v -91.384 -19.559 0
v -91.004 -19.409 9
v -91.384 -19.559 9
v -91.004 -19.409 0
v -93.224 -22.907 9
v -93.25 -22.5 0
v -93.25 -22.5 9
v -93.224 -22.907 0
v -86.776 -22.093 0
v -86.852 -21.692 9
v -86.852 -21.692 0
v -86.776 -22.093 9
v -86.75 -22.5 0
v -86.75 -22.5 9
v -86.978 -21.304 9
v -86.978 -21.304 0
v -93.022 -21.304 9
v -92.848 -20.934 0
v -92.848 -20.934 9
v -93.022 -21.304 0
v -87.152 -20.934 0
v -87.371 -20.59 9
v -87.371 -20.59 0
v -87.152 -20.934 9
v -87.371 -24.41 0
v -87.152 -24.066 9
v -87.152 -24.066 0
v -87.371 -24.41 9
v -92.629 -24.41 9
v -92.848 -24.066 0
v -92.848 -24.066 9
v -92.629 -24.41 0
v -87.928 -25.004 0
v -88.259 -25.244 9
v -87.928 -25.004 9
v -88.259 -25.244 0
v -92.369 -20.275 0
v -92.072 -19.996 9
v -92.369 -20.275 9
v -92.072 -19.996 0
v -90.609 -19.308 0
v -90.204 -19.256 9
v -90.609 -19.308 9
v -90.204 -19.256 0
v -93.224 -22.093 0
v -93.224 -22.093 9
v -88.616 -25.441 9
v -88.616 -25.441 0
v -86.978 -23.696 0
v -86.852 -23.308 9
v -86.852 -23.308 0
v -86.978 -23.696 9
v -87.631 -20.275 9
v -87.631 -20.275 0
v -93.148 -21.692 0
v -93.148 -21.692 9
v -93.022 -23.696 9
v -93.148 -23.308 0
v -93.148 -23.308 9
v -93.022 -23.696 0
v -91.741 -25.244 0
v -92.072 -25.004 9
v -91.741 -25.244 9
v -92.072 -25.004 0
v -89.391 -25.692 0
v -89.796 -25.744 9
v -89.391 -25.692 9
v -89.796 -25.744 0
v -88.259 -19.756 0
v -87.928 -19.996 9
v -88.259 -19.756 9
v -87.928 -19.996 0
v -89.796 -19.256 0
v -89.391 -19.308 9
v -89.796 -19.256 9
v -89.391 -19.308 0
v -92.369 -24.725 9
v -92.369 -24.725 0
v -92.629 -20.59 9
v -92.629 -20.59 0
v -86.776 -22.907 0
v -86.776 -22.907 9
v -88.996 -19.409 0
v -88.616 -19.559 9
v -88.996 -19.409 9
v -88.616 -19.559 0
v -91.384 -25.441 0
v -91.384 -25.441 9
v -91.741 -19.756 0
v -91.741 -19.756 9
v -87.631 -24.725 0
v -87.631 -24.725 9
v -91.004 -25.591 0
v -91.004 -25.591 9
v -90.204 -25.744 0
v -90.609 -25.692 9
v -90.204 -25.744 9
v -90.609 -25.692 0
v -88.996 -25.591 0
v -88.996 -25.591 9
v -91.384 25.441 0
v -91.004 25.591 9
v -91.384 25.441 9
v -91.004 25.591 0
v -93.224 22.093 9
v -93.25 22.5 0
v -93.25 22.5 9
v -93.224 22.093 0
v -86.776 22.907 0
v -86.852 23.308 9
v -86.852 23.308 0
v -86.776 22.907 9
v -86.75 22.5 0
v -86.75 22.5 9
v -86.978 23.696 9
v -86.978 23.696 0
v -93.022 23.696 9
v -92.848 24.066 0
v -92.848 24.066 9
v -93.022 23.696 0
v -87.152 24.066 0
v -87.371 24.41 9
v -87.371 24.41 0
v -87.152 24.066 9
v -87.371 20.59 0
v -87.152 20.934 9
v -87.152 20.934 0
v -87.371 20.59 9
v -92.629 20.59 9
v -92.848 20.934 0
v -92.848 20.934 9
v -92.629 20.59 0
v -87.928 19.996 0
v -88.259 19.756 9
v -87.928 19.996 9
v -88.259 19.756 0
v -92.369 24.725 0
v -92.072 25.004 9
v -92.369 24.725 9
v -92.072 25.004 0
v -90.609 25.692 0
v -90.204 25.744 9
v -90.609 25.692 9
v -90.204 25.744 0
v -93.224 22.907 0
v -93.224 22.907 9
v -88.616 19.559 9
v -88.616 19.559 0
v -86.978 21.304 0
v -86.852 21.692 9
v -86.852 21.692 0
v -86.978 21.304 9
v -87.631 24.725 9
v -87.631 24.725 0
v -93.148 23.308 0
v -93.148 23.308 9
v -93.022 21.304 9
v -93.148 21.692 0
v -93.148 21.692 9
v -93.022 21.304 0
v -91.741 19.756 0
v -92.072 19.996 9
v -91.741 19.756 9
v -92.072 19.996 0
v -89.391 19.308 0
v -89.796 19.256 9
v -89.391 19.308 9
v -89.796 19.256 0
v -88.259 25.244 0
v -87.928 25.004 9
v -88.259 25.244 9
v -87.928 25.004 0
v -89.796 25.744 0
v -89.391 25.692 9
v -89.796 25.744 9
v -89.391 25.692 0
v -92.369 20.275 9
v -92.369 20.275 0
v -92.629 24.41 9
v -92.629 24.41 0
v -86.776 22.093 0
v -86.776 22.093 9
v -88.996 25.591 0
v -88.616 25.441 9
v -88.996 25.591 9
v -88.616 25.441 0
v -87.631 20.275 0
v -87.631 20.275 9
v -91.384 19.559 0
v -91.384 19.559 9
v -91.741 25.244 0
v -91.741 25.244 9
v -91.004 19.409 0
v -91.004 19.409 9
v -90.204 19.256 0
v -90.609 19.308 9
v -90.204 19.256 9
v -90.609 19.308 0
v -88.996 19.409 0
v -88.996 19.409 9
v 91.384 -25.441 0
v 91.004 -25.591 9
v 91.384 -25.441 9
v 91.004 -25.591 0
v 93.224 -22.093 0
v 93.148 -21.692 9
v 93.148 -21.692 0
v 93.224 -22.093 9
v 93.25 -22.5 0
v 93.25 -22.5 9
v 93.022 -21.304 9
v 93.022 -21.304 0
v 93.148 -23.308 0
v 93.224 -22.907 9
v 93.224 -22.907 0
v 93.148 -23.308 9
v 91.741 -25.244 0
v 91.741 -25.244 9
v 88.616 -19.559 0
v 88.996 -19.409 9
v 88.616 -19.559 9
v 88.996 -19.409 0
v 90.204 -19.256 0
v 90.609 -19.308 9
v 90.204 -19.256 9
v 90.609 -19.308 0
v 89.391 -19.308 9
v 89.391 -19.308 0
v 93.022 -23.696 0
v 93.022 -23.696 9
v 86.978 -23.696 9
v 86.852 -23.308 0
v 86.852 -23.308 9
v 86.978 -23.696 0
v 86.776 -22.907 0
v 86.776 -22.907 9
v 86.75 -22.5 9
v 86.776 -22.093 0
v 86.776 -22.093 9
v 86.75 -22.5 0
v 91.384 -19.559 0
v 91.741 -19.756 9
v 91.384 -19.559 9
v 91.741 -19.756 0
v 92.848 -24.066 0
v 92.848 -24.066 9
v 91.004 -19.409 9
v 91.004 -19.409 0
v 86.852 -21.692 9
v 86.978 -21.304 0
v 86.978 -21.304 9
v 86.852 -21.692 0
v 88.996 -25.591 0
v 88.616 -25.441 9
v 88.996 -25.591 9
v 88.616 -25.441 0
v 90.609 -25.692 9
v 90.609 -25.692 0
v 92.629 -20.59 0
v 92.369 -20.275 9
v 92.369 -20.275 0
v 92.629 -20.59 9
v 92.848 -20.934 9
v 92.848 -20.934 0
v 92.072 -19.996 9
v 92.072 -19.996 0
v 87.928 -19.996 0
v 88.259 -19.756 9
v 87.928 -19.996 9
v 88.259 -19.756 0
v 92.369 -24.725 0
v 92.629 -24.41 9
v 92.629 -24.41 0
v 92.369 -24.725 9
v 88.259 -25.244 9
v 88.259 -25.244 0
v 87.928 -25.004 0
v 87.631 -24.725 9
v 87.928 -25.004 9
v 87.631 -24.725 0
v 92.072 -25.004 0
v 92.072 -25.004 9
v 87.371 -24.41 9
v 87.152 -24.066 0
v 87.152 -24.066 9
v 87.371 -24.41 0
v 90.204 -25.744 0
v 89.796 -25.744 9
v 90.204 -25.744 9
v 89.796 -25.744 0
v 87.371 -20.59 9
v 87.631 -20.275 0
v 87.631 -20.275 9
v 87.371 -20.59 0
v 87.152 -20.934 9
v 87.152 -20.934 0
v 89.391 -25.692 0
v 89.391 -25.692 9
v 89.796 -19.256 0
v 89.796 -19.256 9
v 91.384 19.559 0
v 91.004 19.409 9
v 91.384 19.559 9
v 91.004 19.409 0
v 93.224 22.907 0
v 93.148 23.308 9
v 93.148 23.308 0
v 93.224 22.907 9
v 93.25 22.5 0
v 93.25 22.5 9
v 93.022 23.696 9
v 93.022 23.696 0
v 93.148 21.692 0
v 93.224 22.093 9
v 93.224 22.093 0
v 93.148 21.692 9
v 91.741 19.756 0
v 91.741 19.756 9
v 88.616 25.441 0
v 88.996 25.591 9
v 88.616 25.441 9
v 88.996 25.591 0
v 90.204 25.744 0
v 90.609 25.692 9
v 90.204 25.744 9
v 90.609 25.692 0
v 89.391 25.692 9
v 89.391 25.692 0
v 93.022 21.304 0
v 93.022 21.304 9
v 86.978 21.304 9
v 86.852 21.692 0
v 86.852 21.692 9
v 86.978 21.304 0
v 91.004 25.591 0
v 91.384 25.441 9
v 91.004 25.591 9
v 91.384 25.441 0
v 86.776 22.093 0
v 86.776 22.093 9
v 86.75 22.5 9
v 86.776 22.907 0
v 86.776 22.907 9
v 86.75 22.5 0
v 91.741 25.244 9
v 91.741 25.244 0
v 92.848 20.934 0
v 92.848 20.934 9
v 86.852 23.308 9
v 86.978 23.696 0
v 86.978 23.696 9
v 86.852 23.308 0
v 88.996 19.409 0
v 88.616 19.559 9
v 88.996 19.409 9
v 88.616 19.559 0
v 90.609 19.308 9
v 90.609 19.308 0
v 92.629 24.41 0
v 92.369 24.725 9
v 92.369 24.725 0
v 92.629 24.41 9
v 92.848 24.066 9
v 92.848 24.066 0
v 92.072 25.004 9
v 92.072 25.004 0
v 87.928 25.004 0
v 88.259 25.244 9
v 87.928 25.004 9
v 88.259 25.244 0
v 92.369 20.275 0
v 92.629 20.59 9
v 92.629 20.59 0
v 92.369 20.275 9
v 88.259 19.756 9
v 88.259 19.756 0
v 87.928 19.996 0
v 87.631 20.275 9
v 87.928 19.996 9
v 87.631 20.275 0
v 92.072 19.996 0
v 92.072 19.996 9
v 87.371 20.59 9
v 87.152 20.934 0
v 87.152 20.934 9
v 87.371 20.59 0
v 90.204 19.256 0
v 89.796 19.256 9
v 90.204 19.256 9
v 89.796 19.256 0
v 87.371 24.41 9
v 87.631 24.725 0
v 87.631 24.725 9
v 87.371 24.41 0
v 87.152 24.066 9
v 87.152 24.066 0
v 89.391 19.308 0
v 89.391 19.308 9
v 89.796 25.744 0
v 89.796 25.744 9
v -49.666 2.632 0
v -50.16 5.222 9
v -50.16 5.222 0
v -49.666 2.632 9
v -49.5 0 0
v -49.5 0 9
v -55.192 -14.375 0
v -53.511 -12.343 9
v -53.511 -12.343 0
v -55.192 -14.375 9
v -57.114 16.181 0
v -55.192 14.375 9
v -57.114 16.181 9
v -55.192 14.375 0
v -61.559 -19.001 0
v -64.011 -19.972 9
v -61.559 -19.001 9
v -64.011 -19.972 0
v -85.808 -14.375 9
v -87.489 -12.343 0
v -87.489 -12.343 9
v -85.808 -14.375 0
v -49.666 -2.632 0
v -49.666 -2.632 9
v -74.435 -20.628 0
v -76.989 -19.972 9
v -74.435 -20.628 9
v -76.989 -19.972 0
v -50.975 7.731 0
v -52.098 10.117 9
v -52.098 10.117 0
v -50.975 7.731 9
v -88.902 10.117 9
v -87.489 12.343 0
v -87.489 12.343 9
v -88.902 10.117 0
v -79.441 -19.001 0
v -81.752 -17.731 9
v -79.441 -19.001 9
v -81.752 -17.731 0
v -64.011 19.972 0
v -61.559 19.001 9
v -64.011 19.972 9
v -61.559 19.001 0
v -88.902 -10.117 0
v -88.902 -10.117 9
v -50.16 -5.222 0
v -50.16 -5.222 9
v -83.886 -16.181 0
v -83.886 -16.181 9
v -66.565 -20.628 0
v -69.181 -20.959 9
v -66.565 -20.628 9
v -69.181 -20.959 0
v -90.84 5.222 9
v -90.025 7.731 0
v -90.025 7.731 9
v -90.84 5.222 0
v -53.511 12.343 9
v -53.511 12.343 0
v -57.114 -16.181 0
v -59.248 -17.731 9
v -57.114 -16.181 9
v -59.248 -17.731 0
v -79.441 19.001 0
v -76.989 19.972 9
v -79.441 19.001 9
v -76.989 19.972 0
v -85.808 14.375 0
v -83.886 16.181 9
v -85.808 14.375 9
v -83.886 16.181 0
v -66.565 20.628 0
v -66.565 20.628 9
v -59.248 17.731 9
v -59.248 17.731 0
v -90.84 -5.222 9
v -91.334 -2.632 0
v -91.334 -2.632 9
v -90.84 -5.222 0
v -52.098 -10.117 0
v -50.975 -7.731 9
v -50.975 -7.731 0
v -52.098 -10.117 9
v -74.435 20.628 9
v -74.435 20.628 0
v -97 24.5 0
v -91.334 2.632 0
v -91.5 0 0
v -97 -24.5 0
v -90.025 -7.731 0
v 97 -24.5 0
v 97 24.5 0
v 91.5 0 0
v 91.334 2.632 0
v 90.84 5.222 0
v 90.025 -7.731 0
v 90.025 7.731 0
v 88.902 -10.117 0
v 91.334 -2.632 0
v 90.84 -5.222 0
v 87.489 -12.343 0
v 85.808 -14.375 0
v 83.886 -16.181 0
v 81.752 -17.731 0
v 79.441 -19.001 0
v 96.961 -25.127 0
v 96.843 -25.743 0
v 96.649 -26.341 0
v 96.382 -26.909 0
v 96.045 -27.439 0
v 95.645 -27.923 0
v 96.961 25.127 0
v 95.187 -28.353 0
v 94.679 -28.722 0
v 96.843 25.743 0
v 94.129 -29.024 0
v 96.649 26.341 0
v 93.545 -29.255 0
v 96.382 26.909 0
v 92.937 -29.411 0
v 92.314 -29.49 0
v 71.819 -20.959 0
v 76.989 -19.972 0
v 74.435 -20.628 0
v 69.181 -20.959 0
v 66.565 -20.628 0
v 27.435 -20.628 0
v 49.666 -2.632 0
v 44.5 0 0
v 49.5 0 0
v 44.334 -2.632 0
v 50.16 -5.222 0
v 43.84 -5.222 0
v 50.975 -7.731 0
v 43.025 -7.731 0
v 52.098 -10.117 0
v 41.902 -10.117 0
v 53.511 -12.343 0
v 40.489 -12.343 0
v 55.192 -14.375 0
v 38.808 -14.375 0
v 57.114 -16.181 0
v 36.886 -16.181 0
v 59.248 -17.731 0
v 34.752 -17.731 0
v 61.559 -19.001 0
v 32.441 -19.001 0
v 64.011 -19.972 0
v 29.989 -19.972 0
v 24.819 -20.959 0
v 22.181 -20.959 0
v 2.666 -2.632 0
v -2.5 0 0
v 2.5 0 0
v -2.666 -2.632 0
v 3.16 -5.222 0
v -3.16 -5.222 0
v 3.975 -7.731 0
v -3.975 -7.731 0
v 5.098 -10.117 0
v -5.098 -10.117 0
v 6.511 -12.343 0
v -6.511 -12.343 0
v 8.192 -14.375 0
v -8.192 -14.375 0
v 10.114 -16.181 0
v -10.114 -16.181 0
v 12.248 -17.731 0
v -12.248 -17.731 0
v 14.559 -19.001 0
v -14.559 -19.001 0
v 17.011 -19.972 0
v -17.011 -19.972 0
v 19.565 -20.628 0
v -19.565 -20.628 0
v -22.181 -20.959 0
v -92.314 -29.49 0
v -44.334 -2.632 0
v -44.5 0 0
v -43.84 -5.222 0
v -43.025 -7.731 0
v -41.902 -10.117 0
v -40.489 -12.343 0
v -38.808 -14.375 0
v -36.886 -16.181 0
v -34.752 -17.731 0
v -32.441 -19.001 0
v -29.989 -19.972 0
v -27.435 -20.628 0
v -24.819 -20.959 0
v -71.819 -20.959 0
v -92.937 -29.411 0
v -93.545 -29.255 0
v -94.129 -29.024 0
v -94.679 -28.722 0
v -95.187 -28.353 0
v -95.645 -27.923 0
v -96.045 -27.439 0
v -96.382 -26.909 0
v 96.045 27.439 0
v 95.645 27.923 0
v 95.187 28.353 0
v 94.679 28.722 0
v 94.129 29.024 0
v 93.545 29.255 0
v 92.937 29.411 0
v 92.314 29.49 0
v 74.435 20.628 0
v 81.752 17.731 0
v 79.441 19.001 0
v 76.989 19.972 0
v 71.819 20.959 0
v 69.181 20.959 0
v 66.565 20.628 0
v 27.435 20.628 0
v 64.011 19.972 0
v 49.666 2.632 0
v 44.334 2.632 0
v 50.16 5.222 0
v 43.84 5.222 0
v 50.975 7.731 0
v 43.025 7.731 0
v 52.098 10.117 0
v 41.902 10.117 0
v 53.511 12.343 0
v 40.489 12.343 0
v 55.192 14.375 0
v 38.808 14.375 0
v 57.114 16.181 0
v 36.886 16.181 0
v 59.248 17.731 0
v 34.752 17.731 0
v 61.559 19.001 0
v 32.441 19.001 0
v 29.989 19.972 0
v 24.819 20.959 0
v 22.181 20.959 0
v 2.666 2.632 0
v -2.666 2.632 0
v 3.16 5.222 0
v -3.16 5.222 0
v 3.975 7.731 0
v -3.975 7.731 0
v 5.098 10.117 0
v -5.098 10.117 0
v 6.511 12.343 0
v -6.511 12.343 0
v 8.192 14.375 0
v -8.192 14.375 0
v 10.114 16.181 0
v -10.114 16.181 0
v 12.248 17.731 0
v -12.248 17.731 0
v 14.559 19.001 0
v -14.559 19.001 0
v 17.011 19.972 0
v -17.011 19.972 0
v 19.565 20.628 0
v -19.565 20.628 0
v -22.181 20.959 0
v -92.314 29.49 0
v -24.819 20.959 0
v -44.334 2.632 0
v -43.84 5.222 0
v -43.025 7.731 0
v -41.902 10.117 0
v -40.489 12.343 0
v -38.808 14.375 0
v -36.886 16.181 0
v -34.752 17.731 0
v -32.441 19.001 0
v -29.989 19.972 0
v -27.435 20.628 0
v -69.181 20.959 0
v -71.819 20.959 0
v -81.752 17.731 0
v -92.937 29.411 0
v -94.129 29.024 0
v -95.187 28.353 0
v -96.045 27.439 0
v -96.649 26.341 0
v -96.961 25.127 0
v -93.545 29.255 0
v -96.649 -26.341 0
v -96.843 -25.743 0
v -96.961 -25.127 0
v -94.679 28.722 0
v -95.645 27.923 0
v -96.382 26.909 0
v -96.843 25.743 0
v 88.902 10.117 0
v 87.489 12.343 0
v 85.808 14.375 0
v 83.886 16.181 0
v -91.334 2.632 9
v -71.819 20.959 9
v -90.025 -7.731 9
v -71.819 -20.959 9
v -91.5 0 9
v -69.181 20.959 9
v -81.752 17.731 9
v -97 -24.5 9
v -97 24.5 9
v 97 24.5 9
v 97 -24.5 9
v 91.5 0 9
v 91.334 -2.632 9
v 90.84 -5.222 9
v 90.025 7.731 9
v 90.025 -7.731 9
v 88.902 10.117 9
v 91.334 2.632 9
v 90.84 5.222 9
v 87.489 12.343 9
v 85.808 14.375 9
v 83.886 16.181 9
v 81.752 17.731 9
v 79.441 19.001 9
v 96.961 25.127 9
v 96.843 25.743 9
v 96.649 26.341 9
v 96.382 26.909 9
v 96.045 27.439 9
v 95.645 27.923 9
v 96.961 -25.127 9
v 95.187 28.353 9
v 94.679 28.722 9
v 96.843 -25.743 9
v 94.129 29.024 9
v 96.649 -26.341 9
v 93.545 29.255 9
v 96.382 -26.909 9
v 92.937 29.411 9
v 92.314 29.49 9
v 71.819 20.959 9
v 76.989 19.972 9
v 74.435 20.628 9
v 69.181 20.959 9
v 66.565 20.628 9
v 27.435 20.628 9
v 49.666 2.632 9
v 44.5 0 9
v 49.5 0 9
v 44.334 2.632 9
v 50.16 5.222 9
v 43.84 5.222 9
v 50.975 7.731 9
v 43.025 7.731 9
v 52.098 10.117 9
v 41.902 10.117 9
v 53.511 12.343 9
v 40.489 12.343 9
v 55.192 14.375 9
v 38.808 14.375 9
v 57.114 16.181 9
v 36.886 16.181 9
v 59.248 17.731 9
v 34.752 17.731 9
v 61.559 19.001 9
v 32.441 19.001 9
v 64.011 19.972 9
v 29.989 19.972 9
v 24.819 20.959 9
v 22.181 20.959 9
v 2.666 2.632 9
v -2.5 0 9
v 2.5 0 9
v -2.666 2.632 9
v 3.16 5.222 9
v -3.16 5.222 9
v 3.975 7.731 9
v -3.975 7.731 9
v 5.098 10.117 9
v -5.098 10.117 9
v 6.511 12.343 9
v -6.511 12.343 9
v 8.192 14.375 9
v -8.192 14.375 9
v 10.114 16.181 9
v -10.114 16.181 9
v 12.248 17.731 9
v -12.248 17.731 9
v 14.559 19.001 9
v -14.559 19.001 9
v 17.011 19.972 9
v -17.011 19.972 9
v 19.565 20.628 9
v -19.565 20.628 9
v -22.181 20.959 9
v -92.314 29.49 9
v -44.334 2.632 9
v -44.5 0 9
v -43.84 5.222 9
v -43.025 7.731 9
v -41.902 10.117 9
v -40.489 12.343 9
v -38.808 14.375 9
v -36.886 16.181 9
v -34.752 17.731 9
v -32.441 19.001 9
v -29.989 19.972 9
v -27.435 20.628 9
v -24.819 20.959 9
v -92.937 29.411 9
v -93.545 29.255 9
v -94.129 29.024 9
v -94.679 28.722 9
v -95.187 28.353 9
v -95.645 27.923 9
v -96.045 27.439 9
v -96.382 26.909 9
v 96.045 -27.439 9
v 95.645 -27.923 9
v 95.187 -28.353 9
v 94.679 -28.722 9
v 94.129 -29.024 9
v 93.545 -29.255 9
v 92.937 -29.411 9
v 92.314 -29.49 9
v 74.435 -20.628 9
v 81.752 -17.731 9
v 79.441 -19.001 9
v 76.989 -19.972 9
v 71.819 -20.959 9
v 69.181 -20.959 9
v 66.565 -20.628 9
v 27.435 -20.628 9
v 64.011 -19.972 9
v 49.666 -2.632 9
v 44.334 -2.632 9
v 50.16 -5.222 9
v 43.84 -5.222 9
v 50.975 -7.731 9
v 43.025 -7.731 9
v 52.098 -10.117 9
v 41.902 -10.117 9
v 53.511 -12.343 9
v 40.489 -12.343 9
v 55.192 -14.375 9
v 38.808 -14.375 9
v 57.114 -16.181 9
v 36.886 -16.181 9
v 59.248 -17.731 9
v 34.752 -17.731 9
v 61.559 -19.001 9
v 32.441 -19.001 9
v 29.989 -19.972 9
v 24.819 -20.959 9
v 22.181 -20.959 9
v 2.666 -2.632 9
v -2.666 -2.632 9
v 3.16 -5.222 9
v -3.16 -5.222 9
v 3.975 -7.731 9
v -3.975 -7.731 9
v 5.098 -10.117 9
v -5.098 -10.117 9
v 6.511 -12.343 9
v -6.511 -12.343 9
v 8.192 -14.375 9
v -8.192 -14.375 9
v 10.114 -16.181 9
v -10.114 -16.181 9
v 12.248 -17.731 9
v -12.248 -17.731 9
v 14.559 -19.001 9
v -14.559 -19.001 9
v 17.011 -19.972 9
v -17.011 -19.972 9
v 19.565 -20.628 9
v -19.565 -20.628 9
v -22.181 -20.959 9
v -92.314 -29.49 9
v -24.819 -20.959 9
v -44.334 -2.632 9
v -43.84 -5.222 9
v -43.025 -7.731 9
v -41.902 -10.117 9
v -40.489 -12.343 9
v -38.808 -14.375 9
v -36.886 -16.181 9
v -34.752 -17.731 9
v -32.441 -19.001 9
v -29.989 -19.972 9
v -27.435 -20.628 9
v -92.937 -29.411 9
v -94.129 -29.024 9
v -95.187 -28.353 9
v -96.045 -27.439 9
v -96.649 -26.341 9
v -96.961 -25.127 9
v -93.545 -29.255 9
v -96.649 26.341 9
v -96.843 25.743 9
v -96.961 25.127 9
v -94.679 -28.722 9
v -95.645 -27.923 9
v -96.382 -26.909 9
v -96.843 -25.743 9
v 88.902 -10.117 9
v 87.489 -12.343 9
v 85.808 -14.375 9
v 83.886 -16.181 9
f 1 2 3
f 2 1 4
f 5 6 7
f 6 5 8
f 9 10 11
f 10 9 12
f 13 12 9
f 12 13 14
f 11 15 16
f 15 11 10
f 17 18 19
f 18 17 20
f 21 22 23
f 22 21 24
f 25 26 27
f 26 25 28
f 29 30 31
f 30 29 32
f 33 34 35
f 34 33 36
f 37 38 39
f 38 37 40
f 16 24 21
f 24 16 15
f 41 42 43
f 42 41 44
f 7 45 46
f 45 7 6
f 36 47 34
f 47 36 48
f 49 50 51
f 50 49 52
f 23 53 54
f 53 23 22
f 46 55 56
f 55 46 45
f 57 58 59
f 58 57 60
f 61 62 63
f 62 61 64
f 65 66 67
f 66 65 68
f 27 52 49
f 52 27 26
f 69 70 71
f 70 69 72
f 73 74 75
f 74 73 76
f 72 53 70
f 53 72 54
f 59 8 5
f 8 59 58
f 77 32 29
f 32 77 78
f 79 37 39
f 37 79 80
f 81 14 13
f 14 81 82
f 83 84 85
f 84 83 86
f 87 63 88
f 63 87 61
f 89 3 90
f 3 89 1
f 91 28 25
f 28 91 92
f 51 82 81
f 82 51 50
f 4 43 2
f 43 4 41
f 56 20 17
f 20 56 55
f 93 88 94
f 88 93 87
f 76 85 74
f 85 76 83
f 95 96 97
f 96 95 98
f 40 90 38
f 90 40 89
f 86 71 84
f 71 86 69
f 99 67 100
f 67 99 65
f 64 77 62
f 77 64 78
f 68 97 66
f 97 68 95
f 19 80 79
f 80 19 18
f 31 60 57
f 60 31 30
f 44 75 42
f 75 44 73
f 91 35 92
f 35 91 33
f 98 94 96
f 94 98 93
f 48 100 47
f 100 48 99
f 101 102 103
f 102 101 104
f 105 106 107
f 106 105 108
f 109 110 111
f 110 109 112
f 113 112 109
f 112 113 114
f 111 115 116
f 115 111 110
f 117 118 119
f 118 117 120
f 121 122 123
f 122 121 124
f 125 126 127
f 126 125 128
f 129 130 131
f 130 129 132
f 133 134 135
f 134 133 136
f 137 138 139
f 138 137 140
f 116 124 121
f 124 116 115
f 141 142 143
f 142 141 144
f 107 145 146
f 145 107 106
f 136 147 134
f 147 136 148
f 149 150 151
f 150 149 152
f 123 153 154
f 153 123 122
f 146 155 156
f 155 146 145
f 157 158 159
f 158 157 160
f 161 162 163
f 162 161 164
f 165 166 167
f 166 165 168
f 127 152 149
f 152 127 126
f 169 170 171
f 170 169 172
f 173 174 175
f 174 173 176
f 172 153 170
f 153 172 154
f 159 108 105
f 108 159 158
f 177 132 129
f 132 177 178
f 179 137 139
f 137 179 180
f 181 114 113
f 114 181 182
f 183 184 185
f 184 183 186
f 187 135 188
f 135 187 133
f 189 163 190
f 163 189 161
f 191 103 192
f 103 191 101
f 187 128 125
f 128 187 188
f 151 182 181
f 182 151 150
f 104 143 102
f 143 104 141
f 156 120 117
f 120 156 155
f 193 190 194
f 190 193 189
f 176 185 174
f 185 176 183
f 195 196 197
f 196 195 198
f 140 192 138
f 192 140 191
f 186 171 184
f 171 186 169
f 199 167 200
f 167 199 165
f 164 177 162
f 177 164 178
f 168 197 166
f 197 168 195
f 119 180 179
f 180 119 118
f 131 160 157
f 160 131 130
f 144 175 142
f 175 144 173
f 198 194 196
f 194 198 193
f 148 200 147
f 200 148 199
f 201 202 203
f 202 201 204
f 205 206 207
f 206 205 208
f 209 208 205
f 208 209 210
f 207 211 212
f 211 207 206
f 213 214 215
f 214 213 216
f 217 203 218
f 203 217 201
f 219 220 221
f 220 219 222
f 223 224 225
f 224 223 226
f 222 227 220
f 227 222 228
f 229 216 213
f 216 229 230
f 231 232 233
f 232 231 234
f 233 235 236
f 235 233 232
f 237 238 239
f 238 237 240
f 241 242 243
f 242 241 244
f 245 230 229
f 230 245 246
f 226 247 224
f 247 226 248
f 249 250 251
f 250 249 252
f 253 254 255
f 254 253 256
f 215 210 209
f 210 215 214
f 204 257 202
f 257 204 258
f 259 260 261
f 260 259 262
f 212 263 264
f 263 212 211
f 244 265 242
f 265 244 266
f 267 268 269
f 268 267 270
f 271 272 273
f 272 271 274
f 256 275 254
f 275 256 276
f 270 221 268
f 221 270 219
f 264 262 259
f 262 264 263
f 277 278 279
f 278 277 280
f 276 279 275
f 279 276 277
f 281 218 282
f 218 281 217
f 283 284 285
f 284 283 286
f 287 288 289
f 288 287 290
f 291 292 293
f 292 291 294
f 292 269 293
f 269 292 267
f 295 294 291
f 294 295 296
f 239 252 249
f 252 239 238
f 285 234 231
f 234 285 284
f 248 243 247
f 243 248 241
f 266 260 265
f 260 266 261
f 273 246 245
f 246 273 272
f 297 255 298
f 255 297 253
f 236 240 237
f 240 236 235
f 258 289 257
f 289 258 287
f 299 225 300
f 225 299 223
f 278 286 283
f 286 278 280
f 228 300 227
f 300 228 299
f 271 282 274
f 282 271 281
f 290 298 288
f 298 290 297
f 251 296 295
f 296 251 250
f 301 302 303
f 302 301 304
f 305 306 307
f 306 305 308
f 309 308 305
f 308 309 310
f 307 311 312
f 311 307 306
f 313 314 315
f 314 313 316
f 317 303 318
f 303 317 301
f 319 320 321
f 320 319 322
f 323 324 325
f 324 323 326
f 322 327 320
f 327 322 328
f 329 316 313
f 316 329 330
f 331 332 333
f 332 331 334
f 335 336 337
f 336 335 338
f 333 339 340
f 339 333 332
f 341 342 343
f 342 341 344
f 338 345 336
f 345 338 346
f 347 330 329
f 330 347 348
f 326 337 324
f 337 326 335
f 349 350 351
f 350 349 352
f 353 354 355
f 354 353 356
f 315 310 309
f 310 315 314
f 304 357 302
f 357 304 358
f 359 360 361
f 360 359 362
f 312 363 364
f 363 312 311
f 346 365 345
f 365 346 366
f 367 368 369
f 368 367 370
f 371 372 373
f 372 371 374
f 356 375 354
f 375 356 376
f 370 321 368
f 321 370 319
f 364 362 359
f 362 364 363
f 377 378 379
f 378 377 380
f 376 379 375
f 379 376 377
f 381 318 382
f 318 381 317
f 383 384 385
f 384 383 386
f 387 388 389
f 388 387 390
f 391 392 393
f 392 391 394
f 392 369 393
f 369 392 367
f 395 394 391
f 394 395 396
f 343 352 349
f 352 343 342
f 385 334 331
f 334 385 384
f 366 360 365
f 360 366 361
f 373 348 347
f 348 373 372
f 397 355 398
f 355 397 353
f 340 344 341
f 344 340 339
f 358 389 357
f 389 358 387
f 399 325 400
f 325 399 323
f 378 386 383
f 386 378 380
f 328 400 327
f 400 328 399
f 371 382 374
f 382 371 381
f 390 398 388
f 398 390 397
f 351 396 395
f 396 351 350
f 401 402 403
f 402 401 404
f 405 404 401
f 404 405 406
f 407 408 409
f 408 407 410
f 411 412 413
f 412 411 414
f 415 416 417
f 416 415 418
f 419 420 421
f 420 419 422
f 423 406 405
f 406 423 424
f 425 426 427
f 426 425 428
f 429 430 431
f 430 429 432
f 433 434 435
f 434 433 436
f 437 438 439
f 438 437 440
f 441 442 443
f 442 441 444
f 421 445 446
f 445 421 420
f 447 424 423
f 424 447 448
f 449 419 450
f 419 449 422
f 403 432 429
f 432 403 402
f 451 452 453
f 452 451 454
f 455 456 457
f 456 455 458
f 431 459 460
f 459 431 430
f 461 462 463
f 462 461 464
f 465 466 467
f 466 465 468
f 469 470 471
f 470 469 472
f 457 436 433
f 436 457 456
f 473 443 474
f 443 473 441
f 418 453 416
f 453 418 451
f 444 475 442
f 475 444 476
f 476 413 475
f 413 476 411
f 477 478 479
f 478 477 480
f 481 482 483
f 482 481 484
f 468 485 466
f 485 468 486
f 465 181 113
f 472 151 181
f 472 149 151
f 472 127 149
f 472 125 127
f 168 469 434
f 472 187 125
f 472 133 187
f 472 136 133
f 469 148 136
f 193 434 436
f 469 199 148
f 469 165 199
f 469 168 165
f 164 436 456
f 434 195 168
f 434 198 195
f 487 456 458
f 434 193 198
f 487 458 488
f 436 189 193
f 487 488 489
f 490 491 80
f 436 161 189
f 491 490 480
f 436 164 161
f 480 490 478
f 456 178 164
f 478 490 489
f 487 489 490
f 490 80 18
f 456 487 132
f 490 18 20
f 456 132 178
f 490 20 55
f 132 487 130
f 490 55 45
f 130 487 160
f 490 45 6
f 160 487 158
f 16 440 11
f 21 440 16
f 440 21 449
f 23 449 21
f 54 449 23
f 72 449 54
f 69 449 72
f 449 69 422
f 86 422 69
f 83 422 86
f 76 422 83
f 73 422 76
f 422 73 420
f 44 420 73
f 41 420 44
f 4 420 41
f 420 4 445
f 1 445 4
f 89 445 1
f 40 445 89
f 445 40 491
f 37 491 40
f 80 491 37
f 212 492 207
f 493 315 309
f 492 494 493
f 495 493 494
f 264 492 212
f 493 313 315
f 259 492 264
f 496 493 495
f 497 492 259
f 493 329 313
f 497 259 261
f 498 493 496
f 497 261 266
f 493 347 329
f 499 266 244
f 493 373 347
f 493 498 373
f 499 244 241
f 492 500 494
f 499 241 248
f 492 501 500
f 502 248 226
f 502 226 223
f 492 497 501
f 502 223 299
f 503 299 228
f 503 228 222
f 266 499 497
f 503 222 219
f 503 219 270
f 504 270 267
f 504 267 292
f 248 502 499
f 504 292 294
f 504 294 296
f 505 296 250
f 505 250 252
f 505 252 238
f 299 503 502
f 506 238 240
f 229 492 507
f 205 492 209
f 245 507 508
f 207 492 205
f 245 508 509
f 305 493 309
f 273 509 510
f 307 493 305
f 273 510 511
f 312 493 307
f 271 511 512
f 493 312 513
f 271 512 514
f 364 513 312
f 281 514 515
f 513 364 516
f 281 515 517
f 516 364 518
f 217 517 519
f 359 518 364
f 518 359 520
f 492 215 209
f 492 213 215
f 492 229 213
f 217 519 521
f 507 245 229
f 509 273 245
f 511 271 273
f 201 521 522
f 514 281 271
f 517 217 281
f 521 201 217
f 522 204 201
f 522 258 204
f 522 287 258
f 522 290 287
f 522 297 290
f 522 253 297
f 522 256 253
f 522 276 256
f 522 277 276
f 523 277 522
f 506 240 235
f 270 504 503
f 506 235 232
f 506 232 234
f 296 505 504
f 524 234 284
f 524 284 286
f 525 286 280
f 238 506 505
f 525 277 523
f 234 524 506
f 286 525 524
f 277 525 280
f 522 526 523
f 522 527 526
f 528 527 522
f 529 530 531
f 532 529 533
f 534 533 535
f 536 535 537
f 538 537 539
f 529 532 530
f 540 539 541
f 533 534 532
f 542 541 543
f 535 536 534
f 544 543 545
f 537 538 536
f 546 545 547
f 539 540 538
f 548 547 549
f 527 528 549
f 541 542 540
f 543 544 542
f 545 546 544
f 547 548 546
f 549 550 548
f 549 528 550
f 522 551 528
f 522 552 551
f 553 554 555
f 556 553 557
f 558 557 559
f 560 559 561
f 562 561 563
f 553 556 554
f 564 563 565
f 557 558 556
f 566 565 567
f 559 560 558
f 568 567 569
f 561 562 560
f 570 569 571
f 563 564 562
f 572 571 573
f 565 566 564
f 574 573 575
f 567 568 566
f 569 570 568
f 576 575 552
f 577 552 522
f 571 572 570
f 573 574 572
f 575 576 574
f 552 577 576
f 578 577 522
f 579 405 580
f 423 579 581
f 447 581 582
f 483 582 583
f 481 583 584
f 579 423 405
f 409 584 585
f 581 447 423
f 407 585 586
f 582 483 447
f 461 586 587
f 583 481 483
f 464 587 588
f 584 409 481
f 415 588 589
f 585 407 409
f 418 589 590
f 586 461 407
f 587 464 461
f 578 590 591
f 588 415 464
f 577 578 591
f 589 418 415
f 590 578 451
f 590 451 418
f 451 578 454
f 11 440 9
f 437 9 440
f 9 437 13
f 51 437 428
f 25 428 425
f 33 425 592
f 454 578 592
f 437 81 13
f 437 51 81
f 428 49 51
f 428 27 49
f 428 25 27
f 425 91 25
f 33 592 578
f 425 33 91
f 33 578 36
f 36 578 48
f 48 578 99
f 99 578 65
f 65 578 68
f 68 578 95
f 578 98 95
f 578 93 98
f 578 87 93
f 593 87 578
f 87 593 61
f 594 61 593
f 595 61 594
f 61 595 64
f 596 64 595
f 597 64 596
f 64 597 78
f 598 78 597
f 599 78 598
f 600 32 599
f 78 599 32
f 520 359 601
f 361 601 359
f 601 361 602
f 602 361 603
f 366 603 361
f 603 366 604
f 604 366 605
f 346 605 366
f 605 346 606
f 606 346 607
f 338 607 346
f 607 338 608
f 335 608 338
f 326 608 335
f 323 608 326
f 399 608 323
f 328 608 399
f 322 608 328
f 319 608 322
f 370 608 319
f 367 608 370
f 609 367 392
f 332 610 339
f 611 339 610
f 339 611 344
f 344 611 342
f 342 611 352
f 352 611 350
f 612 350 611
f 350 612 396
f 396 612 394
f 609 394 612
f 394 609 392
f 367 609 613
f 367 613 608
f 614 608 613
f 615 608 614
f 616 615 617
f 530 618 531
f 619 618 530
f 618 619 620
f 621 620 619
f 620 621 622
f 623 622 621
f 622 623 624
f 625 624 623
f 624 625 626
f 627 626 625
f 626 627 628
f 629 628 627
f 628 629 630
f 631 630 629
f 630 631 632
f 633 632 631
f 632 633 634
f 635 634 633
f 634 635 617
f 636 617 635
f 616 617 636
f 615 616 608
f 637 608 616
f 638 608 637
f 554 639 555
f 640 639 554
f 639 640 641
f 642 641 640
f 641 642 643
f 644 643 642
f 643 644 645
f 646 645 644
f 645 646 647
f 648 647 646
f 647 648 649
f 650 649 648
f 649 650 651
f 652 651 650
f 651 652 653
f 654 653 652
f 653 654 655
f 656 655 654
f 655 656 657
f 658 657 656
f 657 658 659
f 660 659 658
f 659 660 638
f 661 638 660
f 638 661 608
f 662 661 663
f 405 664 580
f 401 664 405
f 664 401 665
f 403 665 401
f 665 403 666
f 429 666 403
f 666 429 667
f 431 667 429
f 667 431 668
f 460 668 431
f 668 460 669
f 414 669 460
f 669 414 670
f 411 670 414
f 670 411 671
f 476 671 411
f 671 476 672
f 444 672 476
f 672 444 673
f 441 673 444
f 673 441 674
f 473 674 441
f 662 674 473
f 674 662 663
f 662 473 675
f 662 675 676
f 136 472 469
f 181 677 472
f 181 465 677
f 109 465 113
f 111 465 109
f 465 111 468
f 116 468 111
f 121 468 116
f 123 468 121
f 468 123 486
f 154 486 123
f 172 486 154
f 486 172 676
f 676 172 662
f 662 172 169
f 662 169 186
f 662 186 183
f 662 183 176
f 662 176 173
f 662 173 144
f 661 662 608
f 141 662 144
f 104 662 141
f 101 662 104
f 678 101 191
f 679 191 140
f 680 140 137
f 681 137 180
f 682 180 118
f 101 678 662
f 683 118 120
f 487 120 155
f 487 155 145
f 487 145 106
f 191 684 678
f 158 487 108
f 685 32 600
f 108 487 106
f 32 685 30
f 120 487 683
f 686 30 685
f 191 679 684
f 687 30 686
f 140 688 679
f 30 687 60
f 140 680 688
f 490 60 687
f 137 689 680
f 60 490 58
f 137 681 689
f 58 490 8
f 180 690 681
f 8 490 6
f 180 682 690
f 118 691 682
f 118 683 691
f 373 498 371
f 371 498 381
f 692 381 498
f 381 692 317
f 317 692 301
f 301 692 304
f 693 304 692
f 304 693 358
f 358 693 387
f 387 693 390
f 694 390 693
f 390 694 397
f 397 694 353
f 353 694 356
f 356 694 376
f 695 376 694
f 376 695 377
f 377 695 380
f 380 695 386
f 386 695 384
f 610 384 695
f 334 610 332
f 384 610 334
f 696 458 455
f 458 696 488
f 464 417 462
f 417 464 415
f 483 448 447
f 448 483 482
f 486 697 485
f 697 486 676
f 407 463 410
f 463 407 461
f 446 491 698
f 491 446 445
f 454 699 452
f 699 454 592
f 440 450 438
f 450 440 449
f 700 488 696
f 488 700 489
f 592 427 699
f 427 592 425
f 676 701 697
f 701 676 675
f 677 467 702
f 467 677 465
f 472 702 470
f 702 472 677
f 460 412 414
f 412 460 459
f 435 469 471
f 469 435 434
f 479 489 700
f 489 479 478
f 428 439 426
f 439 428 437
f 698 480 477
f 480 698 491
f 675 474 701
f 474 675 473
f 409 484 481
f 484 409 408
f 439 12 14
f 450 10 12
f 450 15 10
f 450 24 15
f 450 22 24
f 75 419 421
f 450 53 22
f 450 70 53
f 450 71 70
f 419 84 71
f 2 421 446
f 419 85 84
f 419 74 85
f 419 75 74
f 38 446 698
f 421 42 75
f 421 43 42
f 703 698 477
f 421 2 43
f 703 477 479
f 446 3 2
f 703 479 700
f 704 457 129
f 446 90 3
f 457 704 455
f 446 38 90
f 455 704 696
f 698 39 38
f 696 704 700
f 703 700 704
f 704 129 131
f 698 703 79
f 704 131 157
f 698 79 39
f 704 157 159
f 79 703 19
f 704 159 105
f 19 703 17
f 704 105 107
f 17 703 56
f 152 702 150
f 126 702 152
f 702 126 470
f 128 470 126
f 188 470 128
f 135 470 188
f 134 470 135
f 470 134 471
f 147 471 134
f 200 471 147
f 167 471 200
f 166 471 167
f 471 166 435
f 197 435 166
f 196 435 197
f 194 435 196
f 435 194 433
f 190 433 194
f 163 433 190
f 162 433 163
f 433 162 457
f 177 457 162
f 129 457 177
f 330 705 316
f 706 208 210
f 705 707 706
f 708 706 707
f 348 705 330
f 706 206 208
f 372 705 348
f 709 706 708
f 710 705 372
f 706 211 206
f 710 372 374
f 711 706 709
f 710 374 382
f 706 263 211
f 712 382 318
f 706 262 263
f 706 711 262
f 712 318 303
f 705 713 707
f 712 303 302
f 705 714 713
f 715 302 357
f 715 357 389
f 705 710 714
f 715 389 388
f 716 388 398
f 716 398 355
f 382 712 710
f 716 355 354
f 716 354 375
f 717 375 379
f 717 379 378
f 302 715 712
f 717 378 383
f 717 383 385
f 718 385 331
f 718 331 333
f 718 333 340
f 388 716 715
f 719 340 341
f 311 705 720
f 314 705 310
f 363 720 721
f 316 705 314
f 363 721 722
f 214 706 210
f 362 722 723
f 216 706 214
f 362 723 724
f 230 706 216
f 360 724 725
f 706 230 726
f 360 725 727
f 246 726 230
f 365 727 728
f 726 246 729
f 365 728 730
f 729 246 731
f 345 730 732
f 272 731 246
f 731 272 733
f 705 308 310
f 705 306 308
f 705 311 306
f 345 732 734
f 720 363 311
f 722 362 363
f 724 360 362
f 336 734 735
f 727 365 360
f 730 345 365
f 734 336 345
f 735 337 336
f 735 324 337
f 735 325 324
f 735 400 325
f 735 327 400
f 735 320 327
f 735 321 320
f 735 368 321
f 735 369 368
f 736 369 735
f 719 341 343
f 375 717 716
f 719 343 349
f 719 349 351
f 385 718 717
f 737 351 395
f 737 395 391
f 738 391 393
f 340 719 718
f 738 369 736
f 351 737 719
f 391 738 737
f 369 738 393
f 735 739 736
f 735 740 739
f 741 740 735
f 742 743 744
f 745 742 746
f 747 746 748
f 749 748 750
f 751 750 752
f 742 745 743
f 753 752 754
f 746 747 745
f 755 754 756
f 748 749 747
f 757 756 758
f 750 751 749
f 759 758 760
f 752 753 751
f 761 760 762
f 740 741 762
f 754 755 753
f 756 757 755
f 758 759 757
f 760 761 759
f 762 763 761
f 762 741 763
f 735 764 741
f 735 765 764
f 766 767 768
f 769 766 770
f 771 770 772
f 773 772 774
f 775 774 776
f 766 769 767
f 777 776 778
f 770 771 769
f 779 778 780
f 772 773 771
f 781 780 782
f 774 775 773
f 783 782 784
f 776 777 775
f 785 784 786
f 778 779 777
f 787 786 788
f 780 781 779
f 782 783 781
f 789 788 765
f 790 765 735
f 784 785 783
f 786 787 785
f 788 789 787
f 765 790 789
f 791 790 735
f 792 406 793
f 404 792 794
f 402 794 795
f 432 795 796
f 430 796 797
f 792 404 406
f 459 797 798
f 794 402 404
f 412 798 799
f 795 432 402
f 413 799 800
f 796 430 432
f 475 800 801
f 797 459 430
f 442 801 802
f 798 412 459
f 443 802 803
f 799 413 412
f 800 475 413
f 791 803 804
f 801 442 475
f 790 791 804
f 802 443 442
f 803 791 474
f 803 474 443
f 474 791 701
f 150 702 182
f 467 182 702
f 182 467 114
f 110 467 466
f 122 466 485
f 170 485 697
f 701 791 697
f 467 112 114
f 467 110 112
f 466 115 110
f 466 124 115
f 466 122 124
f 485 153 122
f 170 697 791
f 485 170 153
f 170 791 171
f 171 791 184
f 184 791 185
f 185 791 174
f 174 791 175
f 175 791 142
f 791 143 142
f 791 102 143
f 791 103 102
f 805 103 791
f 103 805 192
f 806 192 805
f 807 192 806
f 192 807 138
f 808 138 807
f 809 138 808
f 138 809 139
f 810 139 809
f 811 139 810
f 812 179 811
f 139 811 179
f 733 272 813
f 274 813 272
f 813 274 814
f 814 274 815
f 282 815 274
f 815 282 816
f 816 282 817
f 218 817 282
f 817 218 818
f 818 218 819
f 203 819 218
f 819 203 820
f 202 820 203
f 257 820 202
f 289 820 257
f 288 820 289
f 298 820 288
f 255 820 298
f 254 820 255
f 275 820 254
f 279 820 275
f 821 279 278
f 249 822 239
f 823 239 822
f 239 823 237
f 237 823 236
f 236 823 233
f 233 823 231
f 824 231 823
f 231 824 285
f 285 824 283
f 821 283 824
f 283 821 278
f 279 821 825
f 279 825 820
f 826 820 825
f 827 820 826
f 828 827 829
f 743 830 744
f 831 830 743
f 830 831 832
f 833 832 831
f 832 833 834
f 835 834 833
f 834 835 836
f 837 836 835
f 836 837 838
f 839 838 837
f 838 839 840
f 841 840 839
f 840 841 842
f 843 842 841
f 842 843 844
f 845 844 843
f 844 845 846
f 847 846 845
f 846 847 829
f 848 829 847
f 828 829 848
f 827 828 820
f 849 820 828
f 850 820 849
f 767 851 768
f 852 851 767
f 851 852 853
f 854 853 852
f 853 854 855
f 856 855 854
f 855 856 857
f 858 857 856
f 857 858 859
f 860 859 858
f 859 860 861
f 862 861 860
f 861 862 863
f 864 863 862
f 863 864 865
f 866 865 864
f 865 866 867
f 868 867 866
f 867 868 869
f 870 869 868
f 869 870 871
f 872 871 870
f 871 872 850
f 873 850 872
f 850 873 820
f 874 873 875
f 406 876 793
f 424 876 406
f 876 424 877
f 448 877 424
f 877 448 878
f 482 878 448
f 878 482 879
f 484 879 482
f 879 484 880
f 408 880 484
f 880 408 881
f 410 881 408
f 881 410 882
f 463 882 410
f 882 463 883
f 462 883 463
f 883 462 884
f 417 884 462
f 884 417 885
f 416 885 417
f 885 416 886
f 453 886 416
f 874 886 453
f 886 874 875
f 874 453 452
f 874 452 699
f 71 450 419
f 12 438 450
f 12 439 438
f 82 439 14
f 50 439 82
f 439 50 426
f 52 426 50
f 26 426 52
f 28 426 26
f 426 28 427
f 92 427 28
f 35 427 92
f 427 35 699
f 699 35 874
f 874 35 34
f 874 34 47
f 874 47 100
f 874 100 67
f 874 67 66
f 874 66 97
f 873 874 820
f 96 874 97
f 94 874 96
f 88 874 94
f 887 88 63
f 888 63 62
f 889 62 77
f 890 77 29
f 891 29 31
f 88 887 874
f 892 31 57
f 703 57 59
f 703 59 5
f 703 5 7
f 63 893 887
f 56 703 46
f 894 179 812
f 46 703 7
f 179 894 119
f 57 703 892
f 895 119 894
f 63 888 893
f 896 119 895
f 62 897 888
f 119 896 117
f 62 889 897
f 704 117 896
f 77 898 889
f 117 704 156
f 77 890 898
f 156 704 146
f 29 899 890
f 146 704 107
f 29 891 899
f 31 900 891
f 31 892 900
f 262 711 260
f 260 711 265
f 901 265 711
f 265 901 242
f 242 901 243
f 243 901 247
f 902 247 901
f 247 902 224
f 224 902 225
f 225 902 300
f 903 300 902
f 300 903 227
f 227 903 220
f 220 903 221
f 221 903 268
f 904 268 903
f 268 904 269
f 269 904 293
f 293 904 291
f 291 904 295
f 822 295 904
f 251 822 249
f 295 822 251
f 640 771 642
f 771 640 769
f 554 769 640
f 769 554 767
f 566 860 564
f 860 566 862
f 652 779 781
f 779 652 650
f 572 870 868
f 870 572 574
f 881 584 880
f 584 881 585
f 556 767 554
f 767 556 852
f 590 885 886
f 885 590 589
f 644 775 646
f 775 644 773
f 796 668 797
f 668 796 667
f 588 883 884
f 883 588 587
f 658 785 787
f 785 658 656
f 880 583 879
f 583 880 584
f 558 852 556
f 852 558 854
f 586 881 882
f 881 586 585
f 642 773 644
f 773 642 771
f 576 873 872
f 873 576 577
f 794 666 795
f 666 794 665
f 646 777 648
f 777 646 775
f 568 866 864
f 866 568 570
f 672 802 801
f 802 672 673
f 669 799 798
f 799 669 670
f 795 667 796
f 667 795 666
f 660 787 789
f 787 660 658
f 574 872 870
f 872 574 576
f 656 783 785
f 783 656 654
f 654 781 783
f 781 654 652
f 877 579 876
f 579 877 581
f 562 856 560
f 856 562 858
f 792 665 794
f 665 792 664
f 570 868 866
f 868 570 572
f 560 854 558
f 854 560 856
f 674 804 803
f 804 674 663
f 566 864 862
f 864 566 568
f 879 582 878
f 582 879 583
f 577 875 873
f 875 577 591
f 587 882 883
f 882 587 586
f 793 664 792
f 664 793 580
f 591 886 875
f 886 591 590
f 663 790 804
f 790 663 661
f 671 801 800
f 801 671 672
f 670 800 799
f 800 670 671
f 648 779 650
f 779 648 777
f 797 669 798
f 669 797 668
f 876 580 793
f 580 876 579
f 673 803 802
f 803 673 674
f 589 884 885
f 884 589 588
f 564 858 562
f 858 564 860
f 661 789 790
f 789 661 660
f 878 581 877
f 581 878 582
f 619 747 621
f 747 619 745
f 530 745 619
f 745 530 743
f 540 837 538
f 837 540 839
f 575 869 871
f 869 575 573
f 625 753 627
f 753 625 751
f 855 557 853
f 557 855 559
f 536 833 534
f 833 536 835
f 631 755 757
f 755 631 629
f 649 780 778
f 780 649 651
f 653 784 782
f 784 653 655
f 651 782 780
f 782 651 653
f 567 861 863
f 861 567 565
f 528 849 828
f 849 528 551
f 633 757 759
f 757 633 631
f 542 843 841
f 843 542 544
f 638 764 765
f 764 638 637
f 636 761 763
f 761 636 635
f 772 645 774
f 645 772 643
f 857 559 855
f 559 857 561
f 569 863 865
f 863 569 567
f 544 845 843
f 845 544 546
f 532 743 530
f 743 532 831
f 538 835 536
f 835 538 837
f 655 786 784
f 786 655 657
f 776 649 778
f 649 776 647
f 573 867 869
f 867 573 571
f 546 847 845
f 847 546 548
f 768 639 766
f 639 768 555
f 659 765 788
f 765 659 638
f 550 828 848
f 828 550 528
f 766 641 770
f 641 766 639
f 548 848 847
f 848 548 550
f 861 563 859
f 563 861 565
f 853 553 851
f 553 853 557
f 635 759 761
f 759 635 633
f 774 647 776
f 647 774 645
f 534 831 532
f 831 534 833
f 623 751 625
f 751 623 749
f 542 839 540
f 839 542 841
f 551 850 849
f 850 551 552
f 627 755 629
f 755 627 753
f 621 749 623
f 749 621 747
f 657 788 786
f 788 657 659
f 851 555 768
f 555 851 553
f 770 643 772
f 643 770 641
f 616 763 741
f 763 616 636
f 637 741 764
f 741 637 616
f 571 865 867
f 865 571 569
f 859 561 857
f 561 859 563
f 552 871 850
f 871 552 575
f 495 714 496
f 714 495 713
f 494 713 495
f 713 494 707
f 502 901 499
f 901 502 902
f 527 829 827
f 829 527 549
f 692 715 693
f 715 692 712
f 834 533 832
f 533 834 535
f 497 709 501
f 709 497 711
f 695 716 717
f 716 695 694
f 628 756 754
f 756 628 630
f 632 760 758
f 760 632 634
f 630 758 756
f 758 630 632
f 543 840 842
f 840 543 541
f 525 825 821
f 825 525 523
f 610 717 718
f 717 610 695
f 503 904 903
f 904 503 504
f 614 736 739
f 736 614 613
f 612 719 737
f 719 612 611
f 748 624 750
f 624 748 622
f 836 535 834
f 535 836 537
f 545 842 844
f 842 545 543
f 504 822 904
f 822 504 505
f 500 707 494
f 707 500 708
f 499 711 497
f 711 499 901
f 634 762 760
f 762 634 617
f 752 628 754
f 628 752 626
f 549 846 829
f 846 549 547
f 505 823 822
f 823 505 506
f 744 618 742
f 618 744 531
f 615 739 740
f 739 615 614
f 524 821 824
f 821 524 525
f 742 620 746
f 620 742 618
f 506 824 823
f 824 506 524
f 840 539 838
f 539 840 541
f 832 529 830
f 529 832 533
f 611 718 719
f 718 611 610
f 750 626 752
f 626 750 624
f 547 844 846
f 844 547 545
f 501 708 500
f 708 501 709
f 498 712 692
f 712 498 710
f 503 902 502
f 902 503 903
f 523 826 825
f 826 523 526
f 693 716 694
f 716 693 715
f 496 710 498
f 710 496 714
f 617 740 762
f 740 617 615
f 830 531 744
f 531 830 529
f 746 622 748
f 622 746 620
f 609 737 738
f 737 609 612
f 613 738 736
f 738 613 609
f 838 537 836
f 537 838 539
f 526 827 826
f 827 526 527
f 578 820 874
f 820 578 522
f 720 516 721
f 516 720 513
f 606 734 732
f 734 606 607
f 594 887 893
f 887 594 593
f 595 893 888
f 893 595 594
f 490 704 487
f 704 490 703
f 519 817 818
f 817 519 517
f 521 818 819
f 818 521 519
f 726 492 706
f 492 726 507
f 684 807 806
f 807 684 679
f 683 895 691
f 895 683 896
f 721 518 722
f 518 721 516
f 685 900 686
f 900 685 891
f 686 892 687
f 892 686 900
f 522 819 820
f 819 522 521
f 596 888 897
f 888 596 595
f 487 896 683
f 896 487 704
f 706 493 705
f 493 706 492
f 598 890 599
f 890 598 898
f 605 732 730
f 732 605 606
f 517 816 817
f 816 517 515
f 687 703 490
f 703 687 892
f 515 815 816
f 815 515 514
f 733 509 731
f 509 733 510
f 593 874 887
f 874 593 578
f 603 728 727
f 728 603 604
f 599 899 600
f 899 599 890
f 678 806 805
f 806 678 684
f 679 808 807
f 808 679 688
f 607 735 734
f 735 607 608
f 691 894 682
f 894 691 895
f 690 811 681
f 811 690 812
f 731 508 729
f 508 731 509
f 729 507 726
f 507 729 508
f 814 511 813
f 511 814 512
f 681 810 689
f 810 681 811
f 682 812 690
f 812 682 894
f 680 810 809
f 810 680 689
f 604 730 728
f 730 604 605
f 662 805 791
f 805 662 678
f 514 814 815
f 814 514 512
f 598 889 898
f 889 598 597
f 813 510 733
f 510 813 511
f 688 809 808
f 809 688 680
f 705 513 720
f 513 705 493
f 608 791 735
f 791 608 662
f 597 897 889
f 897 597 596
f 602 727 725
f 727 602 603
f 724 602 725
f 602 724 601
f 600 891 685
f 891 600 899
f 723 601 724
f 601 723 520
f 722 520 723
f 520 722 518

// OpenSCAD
$fn = 50;

difference() {
	union() {
		hull() {
			translate(v = [-92.0, 24.5, 0]) {
				cylinder(h = 9, r = 5);
			}
			translate(v = [92.0, 24.5, 0]) {
				cylinder(h = 9, r = 5);
			}
			translate(v = [-92.0, -24.5, 0]) {
				cylinder(h = 9, r = 5);
			}
			translate(v = [92.0, -24.5, 0]) {
				cylinder(h = 9, r = 5);
			}
		}
	}
	union() {
		translate(v = [-90.0, -22.5, -100.0]) {
			cylinder(h = 200, r = 3.25);
		}
		translate(v = [-90.0, 22.5, -100.0]) {
			cylinder(h = 200, r = 3.25);
		}
		translate(v = [90.0, -22.5, -100.0]) {
			cylinder(h = 200, r = 3.25);
		}
		translate(v = [90.0, 22.5, -100.0]) {
			cylinder(h = 200, r = 3.25);
		}
		translate(v = [-90.0, -22.5, -100.0]) {
			cylinder(h = 200, r = 1.8);
		}
		translate(v = [-90.0, 22.5, -100.0]) {
			cylinder(h = 200, r = 1.8);
		}
		translate(v = [90.0, -22.5, -100.0]) {
			cylinder(h = 200, r = 1.8);
		}
		translate(v = [90.0, 22.5, -100.0]) {
			cylinder(h = 200, r = 1.8);
		}
		translate(v = [-70.5, 0, 0.0]) {
			cylinder(h = 9, r = 21.0);
		}
		translate(v = [-23.5, 0, 0.0]) {
			cylinder(h = 9, r = 21.0);
		}
		translate(v = [23.5, 0, 0.0]) {
			cylinder(h = 9, r = 21.0);
		}
		translate(v = [70.5, 0, 0.0]) {
			cylinder(h = 9, r = 21.0);
		}
	}
}
